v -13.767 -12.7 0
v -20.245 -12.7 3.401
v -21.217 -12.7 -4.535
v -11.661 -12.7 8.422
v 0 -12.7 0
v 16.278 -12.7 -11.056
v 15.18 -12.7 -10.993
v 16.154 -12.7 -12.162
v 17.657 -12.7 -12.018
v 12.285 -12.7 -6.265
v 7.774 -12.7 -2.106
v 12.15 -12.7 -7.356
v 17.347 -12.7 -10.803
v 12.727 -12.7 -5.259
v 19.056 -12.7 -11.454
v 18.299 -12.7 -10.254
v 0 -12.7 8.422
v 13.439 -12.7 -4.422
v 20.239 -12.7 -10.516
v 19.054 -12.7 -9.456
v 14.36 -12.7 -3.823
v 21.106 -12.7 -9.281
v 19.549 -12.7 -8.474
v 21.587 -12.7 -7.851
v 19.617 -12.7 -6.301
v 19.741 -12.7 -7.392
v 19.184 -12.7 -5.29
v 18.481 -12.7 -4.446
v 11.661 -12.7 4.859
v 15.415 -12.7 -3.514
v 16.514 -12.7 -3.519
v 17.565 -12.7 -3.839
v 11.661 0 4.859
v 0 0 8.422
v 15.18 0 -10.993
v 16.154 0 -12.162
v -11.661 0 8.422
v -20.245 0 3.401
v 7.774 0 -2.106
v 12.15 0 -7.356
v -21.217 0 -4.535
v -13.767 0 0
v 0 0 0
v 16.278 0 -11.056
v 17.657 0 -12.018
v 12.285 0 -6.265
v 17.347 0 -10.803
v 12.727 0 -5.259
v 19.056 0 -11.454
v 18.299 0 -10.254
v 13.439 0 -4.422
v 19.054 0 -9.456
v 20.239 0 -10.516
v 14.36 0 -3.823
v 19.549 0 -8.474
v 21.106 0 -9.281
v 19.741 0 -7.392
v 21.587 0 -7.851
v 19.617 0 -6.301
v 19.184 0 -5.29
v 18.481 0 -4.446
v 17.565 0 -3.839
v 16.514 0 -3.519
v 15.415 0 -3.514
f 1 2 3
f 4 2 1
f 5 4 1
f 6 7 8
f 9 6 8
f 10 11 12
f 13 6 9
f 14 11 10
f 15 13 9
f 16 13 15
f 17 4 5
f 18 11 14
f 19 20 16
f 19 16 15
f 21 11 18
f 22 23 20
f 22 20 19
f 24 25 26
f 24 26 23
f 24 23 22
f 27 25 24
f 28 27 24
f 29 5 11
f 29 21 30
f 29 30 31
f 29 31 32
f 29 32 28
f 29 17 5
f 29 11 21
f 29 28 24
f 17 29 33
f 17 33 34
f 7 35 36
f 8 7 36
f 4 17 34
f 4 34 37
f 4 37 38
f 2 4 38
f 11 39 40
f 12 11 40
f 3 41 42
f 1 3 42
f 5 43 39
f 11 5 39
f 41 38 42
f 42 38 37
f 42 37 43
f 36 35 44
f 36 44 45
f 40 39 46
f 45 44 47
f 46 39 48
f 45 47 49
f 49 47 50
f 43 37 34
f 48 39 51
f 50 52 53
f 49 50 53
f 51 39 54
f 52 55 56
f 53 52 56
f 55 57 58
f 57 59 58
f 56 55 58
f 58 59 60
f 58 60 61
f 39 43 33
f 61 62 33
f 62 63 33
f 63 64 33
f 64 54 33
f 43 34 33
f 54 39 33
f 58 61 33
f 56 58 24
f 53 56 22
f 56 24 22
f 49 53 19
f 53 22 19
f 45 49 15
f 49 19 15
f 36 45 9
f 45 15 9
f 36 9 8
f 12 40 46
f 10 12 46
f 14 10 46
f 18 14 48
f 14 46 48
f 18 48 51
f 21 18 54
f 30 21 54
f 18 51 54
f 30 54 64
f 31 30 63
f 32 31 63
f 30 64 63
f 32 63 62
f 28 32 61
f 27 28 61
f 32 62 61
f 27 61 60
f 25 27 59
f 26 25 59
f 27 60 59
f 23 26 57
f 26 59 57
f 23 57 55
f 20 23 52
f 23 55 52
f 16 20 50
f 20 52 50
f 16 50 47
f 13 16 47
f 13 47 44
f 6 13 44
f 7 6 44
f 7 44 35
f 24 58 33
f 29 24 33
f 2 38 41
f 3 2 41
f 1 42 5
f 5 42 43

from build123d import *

# Parameters (mm, degrees)
F1_DEPTH = 12.7
F3_D     = 7.5946
F5_DEPTH = 25.4


with BuildPart() as f1:
    # F0 (on Front) → F1 (new body)
    with BuildSketch(Plane.XZ):
        Polygon((-13.766902, 0), (0, 0), (0, 8.422106), (-11.661377, 8.422106), (-20.245446, 3.401235), (-21.217227, -4.53498), align=None)
        Polygon((0, 8.422106), (0, 0), (7.774252, -2.105526), (20.731336, -17.654028), (23.386621, -10.155125), (11.661377, 4.858907), align=None)
    extrude(amount=F1_DEPTH)

    # F3 (through all)
    with Locations(Plane.XZ.offset(12.7)):
        with Locations((15.946049, -7.273637)):
            Hole(F3_D / 2)

    # F4 (on face) → F5 (cut)
    with BuildSketch(Plane.XZ.offset(12.7)):
        with BuildLine():
            ThreePointArc((21.587126, -7.850894), (19.681214, -11.027735), (16.154281, -12.161563))
            Line((16.154281, -12.161563), (20.731336, -17.654028))
            Line((20.731336, -17.654028), (23.386621, -10.155125))
            Line((23.386621, -10.155125), (21.587126, -7.850894))
        make_face()
    extrude(amount=-F5_DEPTH, mode=Mode.SUBTRACT)


solid = f1.part
